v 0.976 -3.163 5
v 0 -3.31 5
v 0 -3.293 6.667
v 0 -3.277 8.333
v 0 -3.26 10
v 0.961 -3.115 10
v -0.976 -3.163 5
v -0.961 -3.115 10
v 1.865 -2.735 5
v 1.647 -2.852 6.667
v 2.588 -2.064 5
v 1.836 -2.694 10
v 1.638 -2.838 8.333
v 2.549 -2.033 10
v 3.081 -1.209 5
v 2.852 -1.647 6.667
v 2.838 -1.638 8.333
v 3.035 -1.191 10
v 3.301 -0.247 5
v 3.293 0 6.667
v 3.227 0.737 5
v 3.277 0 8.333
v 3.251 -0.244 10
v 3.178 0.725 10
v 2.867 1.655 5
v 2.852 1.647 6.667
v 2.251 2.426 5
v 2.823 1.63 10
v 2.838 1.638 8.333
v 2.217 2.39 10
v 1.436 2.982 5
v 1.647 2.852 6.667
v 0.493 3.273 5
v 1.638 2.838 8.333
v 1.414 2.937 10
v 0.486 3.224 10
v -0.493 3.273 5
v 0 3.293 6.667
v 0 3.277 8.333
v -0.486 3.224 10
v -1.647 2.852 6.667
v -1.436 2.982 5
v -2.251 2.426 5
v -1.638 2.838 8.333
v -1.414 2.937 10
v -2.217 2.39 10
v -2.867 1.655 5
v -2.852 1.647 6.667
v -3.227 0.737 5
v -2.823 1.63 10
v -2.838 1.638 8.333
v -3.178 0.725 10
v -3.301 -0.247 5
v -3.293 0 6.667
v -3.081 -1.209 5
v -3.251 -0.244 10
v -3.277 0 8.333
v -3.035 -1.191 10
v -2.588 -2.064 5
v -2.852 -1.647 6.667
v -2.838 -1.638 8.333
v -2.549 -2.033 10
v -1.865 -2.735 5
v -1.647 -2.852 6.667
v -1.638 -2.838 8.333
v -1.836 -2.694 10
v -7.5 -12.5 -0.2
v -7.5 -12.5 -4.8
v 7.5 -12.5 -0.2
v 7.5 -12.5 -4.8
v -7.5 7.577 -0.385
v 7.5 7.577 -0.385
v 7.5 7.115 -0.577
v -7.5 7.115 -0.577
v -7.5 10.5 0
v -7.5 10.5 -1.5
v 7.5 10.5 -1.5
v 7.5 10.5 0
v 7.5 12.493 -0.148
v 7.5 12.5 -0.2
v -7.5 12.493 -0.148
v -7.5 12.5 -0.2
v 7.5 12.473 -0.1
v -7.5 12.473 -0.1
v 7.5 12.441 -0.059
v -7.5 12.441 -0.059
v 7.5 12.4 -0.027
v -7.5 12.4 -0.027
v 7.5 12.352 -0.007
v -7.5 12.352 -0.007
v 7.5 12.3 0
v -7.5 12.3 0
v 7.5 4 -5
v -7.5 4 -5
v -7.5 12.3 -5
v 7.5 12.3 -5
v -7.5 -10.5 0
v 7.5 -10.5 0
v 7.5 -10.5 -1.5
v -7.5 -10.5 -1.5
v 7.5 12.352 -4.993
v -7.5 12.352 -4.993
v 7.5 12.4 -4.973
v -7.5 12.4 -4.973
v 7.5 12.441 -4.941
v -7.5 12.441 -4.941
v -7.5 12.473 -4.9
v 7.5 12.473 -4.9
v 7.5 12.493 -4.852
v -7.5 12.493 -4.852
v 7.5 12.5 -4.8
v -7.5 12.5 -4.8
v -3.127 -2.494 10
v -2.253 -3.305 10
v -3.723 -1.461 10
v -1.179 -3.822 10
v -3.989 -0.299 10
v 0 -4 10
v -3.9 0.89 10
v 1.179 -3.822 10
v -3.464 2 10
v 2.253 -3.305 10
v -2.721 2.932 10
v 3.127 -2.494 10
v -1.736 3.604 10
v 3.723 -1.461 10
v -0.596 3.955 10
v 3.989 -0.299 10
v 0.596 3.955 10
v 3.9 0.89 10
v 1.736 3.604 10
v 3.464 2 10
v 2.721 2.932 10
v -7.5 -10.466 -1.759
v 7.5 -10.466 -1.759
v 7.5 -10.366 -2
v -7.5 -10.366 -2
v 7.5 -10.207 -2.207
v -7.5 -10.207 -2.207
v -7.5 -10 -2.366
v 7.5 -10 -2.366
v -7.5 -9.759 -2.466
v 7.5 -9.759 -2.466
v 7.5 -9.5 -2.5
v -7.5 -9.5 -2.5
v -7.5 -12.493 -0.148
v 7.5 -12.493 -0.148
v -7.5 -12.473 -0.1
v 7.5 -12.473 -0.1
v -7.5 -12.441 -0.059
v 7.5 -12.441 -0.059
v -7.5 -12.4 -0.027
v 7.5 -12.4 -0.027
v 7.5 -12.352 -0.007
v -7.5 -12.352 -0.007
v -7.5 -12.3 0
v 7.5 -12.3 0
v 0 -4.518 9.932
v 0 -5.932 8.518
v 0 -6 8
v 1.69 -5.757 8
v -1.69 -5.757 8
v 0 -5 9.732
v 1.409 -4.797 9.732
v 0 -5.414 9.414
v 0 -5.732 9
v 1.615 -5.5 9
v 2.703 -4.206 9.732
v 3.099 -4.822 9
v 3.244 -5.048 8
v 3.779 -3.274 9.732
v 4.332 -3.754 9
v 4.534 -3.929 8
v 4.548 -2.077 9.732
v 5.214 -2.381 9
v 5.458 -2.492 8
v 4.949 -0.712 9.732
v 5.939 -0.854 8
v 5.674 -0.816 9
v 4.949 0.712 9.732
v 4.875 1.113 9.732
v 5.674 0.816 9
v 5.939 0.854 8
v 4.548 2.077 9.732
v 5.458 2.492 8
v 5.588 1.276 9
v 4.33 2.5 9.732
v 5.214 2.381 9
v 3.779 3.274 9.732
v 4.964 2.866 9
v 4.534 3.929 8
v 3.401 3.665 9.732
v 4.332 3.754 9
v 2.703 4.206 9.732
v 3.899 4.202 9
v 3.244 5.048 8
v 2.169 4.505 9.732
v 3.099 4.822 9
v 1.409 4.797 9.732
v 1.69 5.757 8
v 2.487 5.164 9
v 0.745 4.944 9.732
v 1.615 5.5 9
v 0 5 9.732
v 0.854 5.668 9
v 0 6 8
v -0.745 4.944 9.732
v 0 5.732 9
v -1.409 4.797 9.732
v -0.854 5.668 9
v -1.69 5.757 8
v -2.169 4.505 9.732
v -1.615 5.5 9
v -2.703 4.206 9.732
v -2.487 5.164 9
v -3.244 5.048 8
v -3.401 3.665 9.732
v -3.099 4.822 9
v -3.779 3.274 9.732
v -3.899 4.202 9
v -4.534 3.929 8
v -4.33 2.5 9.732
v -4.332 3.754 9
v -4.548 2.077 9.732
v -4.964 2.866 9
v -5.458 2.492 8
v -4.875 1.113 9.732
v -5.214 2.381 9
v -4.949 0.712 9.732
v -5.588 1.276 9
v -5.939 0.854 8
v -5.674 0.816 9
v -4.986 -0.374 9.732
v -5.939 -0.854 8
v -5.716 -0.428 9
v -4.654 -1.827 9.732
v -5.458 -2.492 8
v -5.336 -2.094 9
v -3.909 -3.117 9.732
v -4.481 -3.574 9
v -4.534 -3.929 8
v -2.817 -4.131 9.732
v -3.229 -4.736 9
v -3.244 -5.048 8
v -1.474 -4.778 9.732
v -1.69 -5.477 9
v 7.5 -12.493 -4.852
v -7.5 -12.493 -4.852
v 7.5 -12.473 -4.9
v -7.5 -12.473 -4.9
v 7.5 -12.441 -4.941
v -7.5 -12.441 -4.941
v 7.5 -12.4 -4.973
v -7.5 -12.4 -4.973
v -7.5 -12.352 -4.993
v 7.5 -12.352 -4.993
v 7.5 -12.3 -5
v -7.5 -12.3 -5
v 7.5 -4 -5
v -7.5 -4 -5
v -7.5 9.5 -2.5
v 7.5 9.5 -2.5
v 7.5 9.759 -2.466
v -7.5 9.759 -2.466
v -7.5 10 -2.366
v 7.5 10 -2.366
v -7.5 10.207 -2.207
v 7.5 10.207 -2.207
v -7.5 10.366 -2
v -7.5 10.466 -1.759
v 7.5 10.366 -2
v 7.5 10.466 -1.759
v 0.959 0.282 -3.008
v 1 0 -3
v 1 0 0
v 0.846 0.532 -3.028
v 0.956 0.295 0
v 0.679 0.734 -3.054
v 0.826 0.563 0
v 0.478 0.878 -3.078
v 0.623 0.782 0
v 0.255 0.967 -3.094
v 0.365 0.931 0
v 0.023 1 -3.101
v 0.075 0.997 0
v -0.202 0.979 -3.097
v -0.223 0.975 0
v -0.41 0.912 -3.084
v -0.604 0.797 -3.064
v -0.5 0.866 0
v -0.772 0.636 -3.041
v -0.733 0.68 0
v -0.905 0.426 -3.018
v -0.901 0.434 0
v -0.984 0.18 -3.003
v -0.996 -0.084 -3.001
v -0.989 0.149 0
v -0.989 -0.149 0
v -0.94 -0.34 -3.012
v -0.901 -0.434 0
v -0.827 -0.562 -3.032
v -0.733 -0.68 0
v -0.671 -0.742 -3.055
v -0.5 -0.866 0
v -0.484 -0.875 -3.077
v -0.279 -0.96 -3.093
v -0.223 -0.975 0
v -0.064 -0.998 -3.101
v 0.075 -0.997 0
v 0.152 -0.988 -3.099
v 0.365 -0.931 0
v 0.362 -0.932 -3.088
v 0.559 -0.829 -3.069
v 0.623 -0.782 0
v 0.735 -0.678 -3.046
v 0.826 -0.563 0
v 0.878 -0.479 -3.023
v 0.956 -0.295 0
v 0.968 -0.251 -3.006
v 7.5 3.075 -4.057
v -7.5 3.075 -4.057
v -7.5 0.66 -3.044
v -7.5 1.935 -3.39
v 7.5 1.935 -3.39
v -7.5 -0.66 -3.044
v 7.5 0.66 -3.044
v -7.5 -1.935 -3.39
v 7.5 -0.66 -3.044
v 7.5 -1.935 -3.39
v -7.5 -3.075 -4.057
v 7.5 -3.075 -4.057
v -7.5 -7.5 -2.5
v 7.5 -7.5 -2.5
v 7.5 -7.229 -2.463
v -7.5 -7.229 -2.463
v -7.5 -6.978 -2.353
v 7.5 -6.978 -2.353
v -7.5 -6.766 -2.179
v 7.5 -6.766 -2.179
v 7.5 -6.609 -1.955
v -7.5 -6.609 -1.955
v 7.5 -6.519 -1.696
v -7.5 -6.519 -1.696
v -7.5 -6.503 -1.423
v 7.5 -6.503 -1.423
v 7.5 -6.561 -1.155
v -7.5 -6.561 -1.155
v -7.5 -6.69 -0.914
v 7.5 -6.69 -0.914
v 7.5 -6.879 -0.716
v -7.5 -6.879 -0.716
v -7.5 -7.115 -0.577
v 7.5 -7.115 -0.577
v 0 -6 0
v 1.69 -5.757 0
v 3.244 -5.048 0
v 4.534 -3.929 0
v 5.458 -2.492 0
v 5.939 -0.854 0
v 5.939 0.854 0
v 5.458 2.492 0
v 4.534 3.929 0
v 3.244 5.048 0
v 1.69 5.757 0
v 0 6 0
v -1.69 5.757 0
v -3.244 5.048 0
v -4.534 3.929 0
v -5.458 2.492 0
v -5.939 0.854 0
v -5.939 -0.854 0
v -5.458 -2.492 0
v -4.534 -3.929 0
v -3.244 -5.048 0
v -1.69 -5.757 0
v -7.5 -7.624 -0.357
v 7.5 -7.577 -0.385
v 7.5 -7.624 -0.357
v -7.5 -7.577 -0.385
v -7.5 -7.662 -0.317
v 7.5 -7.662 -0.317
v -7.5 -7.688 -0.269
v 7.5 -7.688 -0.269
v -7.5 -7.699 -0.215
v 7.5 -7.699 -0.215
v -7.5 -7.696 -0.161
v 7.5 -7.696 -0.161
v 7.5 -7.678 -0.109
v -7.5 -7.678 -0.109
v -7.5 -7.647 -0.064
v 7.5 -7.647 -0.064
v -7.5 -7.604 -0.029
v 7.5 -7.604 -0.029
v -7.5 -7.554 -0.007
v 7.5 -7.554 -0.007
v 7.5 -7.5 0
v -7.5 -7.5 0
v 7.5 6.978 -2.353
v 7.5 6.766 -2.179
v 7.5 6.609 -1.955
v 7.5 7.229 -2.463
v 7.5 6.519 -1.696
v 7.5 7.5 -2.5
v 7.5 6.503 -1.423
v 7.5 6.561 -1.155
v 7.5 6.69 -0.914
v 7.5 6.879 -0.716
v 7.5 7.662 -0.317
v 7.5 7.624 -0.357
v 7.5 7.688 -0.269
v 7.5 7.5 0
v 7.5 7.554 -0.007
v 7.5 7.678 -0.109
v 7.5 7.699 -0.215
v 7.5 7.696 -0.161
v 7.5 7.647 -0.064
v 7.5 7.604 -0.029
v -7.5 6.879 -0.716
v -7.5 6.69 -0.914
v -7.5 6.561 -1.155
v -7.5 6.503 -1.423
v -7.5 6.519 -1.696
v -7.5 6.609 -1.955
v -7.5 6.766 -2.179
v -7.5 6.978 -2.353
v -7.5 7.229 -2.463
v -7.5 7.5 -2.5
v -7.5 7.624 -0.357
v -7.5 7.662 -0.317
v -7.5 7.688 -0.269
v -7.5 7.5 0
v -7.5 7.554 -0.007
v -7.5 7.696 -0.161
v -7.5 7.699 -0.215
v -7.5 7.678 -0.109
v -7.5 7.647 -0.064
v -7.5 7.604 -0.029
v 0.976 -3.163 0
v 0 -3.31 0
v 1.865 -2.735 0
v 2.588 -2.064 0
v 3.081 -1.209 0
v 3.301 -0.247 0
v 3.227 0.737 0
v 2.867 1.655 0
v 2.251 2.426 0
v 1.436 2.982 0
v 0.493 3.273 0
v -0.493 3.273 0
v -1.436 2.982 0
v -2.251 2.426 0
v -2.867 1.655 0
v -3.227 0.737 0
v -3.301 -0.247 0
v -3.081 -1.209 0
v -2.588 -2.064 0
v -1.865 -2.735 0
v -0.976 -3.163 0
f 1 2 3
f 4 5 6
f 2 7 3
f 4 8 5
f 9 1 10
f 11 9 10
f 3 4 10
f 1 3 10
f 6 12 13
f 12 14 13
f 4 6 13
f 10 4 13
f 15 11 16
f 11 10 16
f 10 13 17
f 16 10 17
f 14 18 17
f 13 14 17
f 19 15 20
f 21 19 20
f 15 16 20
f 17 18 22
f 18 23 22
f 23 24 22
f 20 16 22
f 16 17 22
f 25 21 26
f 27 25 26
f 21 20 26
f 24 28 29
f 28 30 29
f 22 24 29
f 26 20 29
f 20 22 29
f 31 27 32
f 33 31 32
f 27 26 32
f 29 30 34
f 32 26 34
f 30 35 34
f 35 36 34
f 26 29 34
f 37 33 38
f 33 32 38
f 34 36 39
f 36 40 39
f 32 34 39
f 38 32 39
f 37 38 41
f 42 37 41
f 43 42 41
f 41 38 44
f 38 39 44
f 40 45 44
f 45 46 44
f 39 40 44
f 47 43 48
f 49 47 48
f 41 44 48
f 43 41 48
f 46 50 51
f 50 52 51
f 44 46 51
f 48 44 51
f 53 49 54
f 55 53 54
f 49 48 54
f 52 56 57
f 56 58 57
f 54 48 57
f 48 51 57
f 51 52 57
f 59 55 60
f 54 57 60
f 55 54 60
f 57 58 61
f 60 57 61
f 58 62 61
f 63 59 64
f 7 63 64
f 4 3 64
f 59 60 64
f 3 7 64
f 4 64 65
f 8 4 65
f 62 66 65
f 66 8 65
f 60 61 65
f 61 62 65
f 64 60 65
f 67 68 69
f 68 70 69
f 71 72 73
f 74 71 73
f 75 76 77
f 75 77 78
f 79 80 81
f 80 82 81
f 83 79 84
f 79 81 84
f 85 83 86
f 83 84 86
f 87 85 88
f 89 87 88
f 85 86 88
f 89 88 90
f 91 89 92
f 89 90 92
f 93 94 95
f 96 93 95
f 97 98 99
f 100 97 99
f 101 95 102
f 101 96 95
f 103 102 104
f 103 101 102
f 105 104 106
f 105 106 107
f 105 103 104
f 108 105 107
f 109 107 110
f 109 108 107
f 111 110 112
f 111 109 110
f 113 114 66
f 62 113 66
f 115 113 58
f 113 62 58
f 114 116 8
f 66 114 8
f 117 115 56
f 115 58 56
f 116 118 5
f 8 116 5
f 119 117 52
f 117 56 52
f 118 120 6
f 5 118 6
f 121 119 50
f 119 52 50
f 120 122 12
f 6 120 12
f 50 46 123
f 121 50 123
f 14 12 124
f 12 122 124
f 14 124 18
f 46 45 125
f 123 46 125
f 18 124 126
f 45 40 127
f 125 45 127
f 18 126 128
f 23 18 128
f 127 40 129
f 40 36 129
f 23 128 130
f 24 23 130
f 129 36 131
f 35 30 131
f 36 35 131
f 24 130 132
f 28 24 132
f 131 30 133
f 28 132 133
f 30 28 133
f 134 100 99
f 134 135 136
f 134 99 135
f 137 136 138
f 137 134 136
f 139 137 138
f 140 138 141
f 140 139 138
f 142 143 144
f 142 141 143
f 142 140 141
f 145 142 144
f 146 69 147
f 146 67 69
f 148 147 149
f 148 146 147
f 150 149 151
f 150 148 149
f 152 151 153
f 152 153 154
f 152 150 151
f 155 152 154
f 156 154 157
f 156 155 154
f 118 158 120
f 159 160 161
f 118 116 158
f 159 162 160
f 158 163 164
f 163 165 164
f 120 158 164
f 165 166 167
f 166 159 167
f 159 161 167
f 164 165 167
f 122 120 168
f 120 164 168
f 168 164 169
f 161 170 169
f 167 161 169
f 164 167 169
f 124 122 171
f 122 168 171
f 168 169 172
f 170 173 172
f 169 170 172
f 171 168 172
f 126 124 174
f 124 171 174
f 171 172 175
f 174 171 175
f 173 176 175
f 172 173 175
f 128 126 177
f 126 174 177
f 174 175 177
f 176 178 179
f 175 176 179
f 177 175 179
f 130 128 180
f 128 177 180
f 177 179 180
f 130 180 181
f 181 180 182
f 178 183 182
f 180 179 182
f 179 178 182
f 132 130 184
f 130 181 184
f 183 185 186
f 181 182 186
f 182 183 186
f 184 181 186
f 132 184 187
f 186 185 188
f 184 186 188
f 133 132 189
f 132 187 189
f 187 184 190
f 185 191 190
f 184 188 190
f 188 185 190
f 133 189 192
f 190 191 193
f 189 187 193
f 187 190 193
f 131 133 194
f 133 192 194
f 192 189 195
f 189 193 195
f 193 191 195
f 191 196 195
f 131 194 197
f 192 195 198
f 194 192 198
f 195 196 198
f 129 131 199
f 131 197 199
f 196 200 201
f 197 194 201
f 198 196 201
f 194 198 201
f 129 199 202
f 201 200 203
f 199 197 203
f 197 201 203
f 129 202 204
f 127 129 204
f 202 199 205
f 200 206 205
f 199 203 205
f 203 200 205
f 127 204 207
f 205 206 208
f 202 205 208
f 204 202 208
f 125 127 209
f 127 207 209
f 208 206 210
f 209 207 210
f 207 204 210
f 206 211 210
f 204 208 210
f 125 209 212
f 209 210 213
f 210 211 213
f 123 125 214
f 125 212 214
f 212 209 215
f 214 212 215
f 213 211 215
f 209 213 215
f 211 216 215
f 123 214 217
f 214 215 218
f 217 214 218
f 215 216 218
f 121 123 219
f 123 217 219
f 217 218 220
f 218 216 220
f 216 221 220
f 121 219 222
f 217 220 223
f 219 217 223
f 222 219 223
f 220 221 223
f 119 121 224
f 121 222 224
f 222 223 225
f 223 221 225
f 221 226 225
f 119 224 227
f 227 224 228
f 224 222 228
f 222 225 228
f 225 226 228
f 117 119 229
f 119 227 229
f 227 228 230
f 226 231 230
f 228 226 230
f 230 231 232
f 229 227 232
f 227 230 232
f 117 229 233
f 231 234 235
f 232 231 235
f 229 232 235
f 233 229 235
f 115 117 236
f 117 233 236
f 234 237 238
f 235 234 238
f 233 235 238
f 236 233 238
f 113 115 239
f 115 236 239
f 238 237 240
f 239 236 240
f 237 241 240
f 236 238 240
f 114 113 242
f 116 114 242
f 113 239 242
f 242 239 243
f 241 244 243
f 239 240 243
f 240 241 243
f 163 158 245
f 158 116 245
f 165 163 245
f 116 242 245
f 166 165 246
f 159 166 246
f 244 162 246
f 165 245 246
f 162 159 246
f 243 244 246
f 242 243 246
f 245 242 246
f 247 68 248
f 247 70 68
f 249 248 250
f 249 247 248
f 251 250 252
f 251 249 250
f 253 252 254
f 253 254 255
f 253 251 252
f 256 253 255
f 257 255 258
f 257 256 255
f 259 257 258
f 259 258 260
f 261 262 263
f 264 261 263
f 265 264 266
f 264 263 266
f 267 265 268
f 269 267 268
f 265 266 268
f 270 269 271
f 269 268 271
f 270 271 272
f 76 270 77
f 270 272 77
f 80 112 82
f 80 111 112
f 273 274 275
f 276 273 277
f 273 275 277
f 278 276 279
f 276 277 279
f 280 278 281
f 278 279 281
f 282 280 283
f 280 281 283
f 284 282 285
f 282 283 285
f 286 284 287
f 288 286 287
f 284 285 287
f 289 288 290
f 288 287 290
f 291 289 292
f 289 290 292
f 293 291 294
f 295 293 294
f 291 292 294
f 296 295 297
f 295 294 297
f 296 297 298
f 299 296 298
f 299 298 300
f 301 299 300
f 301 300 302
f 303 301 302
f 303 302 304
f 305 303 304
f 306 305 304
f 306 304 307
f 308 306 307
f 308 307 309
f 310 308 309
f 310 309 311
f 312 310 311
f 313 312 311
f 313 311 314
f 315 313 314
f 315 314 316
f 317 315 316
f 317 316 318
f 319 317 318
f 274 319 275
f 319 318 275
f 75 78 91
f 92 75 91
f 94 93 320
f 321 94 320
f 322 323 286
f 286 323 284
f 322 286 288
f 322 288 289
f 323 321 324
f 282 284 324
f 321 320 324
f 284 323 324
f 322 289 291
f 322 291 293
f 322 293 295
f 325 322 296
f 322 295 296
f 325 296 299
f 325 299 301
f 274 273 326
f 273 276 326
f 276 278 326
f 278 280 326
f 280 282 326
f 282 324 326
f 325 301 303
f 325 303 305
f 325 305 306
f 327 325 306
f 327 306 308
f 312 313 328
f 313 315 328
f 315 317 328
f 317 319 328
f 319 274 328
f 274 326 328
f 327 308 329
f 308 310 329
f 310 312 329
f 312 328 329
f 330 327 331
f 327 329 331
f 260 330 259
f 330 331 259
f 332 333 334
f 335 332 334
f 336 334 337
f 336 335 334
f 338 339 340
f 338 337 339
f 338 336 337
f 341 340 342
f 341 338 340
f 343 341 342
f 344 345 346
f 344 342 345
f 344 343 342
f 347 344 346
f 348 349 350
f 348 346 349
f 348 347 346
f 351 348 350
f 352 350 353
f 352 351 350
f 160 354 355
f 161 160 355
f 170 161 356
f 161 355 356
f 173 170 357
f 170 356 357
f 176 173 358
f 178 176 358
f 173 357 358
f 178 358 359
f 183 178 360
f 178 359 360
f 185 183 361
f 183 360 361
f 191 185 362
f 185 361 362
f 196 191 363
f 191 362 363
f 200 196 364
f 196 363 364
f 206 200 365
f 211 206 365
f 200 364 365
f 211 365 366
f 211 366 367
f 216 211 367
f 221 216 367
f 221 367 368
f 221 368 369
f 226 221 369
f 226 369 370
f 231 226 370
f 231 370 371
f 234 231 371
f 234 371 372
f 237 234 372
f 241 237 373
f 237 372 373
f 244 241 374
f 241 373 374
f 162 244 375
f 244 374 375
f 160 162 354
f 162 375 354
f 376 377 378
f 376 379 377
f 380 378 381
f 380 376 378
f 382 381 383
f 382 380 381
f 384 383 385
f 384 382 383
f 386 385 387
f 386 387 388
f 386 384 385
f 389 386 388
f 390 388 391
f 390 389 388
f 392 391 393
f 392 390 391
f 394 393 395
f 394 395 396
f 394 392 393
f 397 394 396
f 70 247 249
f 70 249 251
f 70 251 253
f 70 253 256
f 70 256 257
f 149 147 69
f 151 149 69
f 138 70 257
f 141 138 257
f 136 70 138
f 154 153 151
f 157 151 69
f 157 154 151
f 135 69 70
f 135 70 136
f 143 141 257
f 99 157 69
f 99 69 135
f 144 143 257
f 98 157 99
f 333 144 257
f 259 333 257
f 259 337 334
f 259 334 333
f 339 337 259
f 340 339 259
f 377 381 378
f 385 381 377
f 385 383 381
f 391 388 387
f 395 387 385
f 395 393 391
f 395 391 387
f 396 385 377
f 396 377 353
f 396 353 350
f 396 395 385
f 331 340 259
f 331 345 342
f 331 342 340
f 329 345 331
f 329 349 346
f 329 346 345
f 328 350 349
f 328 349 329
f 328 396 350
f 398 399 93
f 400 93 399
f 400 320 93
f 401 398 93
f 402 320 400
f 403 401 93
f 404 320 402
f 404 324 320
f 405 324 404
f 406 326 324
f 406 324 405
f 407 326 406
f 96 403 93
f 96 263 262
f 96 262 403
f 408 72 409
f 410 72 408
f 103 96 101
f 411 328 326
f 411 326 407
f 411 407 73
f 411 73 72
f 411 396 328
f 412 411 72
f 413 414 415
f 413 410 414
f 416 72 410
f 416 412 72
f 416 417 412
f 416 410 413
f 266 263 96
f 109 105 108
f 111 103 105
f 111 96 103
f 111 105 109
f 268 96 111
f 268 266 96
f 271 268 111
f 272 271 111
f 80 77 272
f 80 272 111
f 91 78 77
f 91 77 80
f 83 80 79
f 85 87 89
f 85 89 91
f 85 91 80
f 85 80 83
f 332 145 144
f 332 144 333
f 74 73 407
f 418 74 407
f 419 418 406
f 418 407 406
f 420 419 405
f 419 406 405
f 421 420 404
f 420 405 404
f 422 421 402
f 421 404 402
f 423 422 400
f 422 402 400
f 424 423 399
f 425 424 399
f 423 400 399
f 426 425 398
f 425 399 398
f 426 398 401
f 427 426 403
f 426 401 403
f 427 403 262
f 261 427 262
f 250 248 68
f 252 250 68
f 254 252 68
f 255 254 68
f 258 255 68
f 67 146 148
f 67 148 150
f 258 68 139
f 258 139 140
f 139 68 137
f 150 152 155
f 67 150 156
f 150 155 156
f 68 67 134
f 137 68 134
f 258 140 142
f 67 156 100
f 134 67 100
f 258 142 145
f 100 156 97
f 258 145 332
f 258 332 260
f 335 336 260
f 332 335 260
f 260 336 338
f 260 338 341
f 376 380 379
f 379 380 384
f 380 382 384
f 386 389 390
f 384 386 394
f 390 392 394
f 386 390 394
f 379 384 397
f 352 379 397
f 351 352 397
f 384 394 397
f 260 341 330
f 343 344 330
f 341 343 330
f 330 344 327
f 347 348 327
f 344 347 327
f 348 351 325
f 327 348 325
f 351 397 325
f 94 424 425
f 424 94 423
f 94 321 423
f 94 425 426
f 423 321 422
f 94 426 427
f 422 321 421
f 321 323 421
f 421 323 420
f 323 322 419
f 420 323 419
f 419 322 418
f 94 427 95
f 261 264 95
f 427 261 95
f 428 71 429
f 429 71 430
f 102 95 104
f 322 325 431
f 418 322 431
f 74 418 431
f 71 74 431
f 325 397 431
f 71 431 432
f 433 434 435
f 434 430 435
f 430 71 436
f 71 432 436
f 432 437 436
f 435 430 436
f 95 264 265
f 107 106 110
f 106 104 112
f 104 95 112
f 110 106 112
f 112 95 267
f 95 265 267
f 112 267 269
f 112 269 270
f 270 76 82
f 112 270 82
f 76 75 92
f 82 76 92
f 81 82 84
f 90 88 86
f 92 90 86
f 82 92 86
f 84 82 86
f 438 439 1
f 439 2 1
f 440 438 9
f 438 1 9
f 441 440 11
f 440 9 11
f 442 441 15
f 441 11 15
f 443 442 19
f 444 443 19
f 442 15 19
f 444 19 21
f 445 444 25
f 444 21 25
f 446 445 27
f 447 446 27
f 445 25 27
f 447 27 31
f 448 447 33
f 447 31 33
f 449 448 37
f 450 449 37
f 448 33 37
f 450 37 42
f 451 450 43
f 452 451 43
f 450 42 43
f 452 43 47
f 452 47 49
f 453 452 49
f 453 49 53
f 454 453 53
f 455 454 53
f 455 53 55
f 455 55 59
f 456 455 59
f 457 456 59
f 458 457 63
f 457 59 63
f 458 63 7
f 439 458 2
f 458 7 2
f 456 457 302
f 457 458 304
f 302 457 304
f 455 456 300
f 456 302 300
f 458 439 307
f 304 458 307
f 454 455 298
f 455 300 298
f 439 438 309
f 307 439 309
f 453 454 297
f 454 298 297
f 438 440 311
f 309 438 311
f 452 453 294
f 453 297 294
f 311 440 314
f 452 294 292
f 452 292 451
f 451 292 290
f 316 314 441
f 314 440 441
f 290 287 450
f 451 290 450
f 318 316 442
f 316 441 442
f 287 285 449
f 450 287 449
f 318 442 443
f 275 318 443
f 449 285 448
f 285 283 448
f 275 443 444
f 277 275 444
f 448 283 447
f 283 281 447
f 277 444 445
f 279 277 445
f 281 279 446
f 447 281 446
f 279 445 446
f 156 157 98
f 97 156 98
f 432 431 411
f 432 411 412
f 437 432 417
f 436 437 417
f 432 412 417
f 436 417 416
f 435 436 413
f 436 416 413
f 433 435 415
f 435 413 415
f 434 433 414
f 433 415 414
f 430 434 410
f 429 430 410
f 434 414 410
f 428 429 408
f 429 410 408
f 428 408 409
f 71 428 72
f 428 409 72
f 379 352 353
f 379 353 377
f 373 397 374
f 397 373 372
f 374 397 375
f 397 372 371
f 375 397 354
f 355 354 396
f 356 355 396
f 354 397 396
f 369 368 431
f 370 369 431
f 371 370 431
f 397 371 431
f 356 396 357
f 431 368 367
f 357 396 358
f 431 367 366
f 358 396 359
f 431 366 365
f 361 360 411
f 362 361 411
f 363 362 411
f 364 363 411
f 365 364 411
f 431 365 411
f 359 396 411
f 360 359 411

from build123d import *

# Parameters (mm, degrees)
F2_R      = 2
F3_W      = 25
F3_H      = 5
F4_DEPTH  = 7.5
F6_DEPTH  = 12.5
F7_R      = 0.2
F9_DEPTH  = 12.5
F10_R     = 1
F11_DEPTH = 5.001


with BuildPart() as f1:
    # F0 (on Right) → F1 (revolve)
    with BuildSketch(Plane.YZ):
        Polygon((-6, 0), (-3.31, 0), (-3.31, 5), (-3.26, 10), (-6, 10), align=None)
    revolve(axis=Axis((0, 0, 28.409811), (0, 0, 1)))

    # F2
    f2_edges = [f1.edges().sort_by_distance(p)[0] for p in [
        (0, 6, 10),
    ]]
    fillet(f2_edges, radius=F2_R)

    # F3 (on Right) → F4 (join, symmetric)
    with BuildSketch(Plane.YZ):
        with Locations((0, -2.5)):
            Rectangle(F3_W, F3_H)
    extrude(amount=F4_DEPTH, both=True)

    # F5 (on Right) → F6 (cut, symmetric)
    with BuildSketch(Plane.YZ):
        with BuildLine():
            Line((-8.5, 0), (-10.5, 0))
            Line((-10.5, 0), (-10.5, -1.5))
            ThreePointArc((-10.5, -1.5), (-10.207107, -2.207107), (-9.5, -2.5))
            Line((-9.5, -2.5), (-7.5, -2.5))
            ThreePointArc((-7.5, -2.5), (-6.519419, -1.696116), (-7.115385, -0.576923))
            Line((-7.115385, -0.576923), (-8.5, 0))
        make_face()
        with BuildLine():
            Line((10.5, 0), (8.5, 0))
            Line((8.5, 0), (7.115385, -0.576923))
            ThreePointArc((7.115385, -0.576923), (6.519419, -1.696116), (7.5, -2.5))
            Line((7.5, -2.5), (9.5, -2.5))
            ThreePointArc((9.5, -2.5), (10.207107, -2.207107), (10.5, -1.5))
            Line((10.5, -1.5), (10.5, 0))
        make_face()
    extrude(amount=F6_DEPTH, both=True, mode=Mode.SUBTRACT)

    # F7
    f7_edges = [f1.edges().sort_by_distance(p)[0] for p in [
        (0, -8.5, 0),
        (0, 8.5, 0),
        (0, -12.5, 0),
        (0, 12.5, 0),
        (0, -12.5, -5),
        (0, 12.5, -5),
    ]]
    fillet(f7_edges, radius=F7_R)

    # F8 (on Right) → F9 (cut, symmetric)
    with BuildSketch(Plane.YZ):
        with BuildLine():
            Line((-4, -5), (4, -5))
            ThreePointArc((4, -5), (0, -3), (-4, -5))
        make_face()
    extrude(amount=F9_DEPTH, both=True, mode=Mode.SUBTRACT)

    # F10 (on face) → F11 (cut, through all)
    with BuildSketch(Plane.XY):
        Circle(F10_R)
    extrude(amount=-F11_DEPTH, mode=Mode.SUBTRACT)


solid = f1.part
